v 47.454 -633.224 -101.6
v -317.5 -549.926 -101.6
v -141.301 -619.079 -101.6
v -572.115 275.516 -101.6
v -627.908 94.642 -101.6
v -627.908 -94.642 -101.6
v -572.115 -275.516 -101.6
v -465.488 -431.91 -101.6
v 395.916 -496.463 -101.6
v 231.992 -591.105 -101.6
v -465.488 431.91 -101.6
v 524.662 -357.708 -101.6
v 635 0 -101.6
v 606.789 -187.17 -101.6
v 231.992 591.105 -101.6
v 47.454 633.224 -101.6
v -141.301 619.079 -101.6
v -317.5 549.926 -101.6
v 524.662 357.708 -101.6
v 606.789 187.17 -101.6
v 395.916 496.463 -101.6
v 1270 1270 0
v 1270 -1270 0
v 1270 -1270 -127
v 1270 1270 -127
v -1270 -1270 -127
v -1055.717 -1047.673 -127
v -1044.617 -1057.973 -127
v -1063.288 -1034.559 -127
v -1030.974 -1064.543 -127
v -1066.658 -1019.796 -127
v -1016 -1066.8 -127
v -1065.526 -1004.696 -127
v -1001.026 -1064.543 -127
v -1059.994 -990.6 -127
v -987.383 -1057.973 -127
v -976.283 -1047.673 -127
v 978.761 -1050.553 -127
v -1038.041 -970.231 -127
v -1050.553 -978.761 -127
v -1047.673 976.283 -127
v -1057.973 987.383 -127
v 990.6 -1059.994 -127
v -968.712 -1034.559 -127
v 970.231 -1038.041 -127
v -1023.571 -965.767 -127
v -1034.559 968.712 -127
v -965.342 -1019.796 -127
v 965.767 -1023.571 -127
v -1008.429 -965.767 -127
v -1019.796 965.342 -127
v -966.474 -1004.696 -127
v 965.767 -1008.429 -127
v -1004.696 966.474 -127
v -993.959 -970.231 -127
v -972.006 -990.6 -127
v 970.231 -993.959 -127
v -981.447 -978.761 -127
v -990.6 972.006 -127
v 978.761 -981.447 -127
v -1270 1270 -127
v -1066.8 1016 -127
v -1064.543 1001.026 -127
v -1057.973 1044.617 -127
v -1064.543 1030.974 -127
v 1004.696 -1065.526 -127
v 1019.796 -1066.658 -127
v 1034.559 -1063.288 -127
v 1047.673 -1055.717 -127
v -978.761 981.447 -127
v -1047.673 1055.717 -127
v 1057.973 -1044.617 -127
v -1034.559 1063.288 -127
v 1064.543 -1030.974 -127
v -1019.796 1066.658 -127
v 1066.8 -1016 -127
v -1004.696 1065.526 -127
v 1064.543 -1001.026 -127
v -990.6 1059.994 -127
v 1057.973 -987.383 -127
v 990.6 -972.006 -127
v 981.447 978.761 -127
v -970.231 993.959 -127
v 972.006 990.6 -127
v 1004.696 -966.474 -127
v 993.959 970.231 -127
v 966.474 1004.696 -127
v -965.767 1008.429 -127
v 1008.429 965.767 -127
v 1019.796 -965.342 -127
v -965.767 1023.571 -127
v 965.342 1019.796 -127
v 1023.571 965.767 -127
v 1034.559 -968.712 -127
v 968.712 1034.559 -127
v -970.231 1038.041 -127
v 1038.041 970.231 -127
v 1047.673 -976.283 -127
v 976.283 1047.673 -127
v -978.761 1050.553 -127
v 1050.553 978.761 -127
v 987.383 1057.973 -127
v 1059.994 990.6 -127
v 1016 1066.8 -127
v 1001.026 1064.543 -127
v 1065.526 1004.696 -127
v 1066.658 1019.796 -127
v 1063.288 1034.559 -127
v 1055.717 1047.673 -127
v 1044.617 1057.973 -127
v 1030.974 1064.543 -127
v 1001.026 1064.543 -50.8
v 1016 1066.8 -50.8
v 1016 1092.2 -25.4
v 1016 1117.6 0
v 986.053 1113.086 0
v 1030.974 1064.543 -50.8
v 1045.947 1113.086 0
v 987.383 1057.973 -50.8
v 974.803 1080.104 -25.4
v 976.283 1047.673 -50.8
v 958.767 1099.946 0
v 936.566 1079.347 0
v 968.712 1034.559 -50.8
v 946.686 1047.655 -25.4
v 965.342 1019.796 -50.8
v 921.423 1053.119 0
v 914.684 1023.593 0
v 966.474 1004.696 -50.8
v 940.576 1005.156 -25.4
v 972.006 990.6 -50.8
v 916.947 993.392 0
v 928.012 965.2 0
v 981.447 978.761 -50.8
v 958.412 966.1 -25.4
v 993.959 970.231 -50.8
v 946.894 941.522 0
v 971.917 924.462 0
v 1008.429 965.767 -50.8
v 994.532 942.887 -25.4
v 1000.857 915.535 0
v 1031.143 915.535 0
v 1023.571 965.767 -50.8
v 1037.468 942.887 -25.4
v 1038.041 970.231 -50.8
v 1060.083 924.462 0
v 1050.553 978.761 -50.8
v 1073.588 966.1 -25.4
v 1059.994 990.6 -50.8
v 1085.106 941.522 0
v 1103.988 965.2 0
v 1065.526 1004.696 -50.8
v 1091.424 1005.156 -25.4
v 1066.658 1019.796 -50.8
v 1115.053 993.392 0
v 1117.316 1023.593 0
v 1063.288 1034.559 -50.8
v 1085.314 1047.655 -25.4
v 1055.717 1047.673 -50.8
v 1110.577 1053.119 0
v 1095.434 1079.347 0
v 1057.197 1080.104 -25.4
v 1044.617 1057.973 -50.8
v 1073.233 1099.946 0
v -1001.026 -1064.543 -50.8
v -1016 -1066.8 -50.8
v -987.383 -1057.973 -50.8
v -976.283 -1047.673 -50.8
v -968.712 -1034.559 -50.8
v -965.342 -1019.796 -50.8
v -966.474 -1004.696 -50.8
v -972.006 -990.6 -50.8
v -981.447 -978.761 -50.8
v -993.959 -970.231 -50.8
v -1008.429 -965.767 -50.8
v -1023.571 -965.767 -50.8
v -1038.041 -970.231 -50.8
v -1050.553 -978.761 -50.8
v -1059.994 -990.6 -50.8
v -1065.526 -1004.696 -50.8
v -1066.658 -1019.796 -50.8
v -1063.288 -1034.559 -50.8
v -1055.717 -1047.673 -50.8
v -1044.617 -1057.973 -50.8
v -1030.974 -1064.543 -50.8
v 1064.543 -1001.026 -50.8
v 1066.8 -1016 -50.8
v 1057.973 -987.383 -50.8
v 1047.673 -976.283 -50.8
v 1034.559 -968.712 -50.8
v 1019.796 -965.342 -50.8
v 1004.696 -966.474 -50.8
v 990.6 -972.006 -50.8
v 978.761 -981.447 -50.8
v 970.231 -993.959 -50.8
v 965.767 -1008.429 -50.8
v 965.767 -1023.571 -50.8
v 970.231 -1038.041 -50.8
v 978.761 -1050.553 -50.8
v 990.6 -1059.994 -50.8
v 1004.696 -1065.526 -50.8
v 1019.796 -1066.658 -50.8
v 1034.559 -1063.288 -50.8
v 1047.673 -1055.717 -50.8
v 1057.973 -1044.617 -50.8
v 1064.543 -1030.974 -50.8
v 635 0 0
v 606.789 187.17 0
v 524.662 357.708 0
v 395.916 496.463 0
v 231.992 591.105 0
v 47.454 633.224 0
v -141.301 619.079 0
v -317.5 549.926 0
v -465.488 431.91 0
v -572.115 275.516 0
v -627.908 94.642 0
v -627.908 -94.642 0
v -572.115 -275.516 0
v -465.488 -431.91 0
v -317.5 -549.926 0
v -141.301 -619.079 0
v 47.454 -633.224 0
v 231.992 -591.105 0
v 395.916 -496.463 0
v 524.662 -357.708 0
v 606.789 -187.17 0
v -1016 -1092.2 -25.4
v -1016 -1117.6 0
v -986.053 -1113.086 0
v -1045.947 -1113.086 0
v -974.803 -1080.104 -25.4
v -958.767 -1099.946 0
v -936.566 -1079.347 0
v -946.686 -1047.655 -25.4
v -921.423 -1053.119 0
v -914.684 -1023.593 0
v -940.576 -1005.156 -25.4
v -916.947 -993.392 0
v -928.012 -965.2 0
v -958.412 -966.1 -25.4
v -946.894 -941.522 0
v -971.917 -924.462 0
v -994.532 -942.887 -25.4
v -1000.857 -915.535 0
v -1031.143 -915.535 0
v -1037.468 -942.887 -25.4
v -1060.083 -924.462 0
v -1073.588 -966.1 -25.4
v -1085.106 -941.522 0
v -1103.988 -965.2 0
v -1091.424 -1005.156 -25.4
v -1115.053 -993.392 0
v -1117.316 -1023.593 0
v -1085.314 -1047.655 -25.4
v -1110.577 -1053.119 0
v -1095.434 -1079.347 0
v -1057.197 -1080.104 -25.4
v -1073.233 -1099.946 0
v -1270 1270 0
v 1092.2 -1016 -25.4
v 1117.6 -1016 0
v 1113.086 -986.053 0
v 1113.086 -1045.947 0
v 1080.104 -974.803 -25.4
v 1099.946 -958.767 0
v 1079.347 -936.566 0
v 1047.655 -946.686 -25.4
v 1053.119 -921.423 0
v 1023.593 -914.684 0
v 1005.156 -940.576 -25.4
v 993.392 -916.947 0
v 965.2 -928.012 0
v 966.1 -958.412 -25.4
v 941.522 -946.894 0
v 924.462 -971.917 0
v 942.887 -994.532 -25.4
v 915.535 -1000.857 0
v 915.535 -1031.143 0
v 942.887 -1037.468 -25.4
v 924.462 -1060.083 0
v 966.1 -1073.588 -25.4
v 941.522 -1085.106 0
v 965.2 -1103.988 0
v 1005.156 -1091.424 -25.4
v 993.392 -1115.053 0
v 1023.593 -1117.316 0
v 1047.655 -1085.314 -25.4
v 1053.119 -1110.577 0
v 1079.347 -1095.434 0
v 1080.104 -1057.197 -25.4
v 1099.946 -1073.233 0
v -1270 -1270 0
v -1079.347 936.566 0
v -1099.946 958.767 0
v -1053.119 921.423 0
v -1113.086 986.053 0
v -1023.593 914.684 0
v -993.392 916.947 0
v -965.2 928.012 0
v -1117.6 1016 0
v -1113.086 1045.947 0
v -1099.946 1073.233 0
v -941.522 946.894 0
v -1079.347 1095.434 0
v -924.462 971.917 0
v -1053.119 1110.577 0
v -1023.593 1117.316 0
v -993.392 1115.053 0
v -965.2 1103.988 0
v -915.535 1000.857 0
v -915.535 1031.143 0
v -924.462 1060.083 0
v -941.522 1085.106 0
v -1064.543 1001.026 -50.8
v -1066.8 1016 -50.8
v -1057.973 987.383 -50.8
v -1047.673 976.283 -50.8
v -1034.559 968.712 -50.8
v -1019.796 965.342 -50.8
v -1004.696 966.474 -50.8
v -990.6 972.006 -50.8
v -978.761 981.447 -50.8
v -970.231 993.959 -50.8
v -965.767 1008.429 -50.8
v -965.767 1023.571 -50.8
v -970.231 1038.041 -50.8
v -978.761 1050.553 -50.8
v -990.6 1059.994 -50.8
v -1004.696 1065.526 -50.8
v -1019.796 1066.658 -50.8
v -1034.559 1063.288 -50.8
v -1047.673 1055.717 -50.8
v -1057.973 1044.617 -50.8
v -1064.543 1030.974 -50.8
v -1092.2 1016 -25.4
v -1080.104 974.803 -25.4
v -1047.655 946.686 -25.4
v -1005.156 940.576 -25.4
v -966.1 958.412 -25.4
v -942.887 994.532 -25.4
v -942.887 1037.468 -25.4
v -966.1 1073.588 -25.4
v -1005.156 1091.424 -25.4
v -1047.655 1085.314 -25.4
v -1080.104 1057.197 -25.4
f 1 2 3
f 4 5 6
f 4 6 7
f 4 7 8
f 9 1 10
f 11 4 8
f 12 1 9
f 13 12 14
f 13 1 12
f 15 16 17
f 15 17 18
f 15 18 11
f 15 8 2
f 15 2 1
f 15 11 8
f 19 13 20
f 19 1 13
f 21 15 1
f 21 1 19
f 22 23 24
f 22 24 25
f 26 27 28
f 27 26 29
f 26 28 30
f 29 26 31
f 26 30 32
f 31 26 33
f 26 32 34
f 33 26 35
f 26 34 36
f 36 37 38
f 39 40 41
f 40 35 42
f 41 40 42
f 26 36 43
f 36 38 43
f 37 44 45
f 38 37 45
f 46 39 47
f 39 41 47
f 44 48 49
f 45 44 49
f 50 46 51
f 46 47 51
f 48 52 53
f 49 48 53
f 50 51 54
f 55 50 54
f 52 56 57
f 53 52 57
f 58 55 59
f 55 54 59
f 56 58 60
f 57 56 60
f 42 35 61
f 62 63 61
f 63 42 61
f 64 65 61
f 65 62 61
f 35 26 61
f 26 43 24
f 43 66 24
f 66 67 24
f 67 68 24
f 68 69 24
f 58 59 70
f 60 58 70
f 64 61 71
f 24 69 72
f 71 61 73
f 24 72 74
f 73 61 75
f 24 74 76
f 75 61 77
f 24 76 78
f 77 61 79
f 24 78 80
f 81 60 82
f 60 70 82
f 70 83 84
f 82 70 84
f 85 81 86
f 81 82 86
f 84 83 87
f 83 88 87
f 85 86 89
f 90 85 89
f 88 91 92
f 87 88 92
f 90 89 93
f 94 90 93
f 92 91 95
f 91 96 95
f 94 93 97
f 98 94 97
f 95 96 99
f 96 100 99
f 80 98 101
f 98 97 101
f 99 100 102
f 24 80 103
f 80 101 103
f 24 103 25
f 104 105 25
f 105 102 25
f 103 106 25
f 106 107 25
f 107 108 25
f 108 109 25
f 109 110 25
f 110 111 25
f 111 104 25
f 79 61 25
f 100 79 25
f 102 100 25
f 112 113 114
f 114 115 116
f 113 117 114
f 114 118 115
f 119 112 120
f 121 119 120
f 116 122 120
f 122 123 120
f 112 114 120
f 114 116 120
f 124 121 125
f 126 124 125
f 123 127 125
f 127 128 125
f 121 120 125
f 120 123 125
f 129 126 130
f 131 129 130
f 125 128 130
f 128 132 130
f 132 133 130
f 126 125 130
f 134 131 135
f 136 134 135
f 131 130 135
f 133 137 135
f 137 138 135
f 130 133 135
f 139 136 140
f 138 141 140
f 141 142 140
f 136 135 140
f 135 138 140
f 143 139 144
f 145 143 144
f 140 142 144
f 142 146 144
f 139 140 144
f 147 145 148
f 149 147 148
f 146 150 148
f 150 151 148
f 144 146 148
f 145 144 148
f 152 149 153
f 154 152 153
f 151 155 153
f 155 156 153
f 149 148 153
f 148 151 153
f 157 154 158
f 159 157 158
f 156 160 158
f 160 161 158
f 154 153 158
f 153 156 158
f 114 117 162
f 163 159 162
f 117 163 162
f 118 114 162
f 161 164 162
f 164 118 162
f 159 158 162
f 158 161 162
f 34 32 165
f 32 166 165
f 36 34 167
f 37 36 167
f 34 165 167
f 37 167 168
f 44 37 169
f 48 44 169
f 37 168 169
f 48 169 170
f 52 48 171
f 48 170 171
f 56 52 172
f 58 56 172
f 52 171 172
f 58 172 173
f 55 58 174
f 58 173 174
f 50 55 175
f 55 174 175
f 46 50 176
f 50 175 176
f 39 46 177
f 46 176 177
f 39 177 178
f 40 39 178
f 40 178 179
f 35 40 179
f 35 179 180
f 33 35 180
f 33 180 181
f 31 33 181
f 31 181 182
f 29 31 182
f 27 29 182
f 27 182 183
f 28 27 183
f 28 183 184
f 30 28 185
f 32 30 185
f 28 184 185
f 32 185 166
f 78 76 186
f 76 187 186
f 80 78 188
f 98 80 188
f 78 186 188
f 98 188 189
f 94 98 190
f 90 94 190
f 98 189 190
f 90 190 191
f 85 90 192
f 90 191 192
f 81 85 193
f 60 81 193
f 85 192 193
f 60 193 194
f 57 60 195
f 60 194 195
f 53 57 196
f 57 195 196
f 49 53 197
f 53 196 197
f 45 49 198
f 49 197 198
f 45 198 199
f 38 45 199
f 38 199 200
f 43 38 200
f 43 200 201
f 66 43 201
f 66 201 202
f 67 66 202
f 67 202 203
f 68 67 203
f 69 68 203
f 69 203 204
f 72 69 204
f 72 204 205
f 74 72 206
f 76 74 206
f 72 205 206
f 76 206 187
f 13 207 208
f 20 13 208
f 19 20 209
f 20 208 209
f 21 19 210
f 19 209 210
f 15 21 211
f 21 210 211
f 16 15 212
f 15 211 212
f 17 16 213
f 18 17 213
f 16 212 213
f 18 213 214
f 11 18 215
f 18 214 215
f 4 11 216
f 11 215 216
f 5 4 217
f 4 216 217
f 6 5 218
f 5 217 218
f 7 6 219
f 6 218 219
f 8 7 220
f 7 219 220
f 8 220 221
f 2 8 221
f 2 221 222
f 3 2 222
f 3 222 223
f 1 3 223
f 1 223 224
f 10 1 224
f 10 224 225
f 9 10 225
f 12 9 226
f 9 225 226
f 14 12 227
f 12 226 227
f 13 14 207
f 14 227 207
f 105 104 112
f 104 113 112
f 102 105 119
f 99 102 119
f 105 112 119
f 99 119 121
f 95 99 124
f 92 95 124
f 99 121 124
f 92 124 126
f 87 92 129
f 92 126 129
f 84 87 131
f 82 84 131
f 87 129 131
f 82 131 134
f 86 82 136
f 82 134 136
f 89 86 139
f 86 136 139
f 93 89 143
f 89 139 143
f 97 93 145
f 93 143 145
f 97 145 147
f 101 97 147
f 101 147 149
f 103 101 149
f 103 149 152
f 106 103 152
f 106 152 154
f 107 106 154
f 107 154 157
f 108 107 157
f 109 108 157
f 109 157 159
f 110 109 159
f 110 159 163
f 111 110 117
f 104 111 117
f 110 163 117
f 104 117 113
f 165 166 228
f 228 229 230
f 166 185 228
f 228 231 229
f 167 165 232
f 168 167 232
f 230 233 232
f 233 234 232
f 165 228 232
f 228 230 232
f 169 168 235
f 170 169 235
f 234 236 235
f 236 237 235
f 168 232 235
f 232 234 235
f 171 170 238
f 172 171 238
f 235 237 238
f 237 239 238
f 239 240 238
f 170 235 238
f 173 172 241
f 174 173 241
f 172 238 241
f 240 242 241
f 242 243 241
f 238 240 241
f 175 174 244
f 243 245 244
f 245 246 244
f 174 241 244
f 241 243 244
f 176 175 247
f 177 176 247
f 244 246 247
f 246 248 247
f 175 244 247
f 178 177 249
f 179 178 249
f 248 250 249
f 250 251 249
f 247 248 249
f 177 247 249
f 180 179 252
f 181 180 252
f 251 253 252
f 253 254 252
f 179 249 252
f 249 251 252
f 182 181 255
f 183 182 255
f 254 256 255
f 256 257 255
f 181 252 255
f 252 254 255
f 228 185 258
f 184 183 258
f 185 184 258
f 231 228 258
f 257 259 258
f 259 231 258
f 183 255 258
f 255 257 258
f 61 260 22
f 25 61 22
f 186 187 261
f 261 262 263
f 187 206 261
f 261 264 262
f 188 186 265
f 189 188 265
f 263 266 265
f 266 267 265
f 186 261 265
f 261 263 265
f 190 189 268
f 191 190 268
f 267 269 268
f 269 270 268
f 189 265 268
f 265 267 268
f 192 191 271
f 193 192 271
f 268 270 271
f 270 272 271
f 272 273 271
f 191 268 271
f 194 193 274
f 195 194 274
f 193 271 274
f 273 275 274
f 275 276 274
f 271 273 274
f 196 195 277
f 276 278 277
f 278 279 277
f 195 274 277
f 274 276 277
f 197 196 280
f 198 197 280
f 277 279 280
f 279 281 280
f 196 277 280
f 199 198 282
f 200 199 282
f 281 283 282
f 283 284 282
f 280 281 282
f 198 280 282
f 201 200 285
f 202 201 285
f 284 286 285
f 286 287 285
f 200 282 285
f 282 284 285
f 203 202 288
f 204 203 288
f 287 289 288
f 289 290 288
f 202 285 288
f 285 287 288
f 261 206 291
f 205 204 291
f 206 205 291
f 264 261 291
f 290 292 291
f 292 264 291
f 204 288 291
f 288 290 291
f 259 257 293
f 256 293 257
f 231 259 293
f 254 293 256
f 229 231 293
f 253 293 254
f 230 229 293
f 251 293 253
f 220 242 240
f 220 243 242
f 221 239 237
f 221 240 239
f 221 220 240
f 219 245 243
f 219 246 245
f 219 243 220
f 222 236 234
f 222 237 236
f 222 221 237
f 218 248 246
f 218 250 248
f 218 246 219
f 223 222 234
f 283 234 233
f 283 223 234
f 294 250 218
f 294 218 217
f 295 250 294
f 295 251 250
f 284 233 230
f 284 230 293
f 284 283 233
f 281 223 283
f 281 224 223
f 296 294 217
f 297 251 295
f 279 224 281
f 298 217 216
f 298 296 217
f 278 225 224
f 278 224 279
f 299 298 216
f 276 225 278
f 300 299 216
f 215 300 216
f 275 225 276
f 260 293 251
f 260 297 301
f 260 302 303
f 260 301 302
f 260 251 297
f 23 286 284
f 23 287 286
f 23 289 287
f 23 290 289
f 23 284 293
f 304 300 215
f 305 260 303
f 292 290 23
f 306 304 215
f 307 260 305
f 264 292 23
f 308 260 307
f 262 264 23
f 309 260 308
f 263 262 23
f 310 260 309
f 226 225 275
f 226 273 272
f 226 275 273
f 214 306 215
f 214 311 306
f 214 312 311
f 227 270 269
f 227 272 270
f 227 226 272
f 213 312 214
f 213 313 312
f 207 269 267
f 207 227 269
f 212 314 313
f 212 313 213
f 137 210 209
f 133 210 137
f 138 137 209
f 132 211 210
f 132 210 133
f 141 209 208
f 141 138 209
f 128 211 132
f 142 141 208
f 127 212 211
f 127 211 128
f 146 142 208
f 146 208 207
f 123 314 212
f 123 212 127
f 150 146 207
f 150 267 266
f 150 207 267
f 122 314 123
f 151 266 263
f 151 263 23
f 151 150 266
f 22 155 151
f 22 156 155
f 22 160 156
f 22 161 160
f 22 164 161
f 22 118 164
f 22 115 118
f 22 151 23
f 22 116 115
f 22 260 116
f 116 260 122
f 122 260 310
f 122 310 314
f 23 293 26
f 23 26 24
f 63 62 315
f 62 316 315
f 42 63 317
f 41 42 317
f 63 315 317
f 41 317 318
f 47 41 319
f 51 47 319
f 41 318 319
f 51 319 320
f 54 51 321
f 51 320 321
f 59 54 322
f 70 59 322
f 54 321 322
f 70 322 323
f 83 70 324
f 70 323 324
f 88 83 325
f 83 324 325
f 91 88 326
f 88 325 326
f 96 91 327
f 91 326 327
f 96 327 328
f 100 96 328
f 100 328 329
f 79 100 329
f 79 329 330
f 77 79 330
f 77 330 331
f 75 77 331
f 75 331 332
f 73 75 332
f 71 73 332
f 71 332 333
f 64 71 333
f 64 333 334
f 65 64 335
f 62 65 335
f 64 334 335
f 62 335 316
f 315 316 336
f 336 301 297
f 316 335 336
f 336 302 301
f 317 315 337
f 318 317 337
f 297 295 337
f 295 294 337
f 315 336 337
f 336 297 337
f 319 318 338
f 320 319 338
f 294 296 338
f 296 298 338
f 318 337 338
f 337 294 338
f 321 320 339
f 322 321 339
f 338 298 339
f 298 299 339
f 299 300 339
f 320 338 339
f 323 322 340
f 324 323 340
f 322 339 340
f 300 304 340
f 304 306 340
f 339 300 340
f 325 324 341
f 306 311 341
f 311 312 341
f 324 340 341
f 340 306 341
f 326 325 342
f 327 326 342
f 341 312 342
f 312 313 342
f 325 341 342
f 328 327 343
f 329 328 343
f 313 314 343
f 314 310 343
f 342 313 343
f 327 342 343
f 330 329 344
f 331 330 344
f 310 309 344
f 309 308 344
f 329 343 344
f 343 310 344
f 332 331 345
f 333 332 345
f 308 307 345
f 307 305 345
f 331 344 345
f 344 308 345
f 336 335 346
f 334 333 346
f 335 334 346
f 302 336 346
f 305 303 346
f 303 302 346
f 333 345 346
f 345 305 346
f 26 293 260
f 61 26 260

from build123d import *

# Parameters (mm, degrees)
SKETCH1_W           = 2540
SKETCH1_H           = 2540
BOSS_EXTRUDE1_DEPTH = 127
SKETCH2_R           = 635
CUT_EXTRUDE1_DEPTH  = 101.6
CIRPATTERN1_COUNT   = 4


with BuildPart() as part:
    # Sketch1 → Boss-Extrude1 (new body)
    with BuildSketch(Plane.XY):
        Rectangle(SKETCH1_W, SKETCH1_H)
    extrude(amount=-BOSS_EXTRUDE1_DEPTH)

    # Sketch2 → Cut-Extrude1 (cut)
    with BuildSketch(Plane.XY):
        Circle(SKETCH2_R)
    extrude(amount=-CUT_EXTRUDE1_DEPTH, mode=Mode.SUBTRACT)

    # Sketch3 → Cut-Revolve1 (revolve, cut)
    with BuildSketch(Plane(origin=(1016, 0, 0), x_dir=(0, 0, -1), z_dir=(1, 0, 0))):
        Polygon((127, 1066.8), (50.8, 1066.8), (0, 1117.6), (0, 1016), (127, 1016), align=None)
    cut_revolve1 = revolve(axis=Axis((1016, 1016, -127), (0, 0, 1)), mode=Mode.SUBTRACT)

    # CirPattern1: Cut-Revolve1 ×4 about axis
    cirpattern1_axis = Axis((0, 0, 0), (0, 0, 1))
    for i in range(1, CIRPATTERN1_COUNT):
        add(cut_revolve1.rotate(cirpattern1_axis, i * 360 / CIRPATTERN1_COUNT), mode=Mode.SUBTRACT)


solid = part.part
